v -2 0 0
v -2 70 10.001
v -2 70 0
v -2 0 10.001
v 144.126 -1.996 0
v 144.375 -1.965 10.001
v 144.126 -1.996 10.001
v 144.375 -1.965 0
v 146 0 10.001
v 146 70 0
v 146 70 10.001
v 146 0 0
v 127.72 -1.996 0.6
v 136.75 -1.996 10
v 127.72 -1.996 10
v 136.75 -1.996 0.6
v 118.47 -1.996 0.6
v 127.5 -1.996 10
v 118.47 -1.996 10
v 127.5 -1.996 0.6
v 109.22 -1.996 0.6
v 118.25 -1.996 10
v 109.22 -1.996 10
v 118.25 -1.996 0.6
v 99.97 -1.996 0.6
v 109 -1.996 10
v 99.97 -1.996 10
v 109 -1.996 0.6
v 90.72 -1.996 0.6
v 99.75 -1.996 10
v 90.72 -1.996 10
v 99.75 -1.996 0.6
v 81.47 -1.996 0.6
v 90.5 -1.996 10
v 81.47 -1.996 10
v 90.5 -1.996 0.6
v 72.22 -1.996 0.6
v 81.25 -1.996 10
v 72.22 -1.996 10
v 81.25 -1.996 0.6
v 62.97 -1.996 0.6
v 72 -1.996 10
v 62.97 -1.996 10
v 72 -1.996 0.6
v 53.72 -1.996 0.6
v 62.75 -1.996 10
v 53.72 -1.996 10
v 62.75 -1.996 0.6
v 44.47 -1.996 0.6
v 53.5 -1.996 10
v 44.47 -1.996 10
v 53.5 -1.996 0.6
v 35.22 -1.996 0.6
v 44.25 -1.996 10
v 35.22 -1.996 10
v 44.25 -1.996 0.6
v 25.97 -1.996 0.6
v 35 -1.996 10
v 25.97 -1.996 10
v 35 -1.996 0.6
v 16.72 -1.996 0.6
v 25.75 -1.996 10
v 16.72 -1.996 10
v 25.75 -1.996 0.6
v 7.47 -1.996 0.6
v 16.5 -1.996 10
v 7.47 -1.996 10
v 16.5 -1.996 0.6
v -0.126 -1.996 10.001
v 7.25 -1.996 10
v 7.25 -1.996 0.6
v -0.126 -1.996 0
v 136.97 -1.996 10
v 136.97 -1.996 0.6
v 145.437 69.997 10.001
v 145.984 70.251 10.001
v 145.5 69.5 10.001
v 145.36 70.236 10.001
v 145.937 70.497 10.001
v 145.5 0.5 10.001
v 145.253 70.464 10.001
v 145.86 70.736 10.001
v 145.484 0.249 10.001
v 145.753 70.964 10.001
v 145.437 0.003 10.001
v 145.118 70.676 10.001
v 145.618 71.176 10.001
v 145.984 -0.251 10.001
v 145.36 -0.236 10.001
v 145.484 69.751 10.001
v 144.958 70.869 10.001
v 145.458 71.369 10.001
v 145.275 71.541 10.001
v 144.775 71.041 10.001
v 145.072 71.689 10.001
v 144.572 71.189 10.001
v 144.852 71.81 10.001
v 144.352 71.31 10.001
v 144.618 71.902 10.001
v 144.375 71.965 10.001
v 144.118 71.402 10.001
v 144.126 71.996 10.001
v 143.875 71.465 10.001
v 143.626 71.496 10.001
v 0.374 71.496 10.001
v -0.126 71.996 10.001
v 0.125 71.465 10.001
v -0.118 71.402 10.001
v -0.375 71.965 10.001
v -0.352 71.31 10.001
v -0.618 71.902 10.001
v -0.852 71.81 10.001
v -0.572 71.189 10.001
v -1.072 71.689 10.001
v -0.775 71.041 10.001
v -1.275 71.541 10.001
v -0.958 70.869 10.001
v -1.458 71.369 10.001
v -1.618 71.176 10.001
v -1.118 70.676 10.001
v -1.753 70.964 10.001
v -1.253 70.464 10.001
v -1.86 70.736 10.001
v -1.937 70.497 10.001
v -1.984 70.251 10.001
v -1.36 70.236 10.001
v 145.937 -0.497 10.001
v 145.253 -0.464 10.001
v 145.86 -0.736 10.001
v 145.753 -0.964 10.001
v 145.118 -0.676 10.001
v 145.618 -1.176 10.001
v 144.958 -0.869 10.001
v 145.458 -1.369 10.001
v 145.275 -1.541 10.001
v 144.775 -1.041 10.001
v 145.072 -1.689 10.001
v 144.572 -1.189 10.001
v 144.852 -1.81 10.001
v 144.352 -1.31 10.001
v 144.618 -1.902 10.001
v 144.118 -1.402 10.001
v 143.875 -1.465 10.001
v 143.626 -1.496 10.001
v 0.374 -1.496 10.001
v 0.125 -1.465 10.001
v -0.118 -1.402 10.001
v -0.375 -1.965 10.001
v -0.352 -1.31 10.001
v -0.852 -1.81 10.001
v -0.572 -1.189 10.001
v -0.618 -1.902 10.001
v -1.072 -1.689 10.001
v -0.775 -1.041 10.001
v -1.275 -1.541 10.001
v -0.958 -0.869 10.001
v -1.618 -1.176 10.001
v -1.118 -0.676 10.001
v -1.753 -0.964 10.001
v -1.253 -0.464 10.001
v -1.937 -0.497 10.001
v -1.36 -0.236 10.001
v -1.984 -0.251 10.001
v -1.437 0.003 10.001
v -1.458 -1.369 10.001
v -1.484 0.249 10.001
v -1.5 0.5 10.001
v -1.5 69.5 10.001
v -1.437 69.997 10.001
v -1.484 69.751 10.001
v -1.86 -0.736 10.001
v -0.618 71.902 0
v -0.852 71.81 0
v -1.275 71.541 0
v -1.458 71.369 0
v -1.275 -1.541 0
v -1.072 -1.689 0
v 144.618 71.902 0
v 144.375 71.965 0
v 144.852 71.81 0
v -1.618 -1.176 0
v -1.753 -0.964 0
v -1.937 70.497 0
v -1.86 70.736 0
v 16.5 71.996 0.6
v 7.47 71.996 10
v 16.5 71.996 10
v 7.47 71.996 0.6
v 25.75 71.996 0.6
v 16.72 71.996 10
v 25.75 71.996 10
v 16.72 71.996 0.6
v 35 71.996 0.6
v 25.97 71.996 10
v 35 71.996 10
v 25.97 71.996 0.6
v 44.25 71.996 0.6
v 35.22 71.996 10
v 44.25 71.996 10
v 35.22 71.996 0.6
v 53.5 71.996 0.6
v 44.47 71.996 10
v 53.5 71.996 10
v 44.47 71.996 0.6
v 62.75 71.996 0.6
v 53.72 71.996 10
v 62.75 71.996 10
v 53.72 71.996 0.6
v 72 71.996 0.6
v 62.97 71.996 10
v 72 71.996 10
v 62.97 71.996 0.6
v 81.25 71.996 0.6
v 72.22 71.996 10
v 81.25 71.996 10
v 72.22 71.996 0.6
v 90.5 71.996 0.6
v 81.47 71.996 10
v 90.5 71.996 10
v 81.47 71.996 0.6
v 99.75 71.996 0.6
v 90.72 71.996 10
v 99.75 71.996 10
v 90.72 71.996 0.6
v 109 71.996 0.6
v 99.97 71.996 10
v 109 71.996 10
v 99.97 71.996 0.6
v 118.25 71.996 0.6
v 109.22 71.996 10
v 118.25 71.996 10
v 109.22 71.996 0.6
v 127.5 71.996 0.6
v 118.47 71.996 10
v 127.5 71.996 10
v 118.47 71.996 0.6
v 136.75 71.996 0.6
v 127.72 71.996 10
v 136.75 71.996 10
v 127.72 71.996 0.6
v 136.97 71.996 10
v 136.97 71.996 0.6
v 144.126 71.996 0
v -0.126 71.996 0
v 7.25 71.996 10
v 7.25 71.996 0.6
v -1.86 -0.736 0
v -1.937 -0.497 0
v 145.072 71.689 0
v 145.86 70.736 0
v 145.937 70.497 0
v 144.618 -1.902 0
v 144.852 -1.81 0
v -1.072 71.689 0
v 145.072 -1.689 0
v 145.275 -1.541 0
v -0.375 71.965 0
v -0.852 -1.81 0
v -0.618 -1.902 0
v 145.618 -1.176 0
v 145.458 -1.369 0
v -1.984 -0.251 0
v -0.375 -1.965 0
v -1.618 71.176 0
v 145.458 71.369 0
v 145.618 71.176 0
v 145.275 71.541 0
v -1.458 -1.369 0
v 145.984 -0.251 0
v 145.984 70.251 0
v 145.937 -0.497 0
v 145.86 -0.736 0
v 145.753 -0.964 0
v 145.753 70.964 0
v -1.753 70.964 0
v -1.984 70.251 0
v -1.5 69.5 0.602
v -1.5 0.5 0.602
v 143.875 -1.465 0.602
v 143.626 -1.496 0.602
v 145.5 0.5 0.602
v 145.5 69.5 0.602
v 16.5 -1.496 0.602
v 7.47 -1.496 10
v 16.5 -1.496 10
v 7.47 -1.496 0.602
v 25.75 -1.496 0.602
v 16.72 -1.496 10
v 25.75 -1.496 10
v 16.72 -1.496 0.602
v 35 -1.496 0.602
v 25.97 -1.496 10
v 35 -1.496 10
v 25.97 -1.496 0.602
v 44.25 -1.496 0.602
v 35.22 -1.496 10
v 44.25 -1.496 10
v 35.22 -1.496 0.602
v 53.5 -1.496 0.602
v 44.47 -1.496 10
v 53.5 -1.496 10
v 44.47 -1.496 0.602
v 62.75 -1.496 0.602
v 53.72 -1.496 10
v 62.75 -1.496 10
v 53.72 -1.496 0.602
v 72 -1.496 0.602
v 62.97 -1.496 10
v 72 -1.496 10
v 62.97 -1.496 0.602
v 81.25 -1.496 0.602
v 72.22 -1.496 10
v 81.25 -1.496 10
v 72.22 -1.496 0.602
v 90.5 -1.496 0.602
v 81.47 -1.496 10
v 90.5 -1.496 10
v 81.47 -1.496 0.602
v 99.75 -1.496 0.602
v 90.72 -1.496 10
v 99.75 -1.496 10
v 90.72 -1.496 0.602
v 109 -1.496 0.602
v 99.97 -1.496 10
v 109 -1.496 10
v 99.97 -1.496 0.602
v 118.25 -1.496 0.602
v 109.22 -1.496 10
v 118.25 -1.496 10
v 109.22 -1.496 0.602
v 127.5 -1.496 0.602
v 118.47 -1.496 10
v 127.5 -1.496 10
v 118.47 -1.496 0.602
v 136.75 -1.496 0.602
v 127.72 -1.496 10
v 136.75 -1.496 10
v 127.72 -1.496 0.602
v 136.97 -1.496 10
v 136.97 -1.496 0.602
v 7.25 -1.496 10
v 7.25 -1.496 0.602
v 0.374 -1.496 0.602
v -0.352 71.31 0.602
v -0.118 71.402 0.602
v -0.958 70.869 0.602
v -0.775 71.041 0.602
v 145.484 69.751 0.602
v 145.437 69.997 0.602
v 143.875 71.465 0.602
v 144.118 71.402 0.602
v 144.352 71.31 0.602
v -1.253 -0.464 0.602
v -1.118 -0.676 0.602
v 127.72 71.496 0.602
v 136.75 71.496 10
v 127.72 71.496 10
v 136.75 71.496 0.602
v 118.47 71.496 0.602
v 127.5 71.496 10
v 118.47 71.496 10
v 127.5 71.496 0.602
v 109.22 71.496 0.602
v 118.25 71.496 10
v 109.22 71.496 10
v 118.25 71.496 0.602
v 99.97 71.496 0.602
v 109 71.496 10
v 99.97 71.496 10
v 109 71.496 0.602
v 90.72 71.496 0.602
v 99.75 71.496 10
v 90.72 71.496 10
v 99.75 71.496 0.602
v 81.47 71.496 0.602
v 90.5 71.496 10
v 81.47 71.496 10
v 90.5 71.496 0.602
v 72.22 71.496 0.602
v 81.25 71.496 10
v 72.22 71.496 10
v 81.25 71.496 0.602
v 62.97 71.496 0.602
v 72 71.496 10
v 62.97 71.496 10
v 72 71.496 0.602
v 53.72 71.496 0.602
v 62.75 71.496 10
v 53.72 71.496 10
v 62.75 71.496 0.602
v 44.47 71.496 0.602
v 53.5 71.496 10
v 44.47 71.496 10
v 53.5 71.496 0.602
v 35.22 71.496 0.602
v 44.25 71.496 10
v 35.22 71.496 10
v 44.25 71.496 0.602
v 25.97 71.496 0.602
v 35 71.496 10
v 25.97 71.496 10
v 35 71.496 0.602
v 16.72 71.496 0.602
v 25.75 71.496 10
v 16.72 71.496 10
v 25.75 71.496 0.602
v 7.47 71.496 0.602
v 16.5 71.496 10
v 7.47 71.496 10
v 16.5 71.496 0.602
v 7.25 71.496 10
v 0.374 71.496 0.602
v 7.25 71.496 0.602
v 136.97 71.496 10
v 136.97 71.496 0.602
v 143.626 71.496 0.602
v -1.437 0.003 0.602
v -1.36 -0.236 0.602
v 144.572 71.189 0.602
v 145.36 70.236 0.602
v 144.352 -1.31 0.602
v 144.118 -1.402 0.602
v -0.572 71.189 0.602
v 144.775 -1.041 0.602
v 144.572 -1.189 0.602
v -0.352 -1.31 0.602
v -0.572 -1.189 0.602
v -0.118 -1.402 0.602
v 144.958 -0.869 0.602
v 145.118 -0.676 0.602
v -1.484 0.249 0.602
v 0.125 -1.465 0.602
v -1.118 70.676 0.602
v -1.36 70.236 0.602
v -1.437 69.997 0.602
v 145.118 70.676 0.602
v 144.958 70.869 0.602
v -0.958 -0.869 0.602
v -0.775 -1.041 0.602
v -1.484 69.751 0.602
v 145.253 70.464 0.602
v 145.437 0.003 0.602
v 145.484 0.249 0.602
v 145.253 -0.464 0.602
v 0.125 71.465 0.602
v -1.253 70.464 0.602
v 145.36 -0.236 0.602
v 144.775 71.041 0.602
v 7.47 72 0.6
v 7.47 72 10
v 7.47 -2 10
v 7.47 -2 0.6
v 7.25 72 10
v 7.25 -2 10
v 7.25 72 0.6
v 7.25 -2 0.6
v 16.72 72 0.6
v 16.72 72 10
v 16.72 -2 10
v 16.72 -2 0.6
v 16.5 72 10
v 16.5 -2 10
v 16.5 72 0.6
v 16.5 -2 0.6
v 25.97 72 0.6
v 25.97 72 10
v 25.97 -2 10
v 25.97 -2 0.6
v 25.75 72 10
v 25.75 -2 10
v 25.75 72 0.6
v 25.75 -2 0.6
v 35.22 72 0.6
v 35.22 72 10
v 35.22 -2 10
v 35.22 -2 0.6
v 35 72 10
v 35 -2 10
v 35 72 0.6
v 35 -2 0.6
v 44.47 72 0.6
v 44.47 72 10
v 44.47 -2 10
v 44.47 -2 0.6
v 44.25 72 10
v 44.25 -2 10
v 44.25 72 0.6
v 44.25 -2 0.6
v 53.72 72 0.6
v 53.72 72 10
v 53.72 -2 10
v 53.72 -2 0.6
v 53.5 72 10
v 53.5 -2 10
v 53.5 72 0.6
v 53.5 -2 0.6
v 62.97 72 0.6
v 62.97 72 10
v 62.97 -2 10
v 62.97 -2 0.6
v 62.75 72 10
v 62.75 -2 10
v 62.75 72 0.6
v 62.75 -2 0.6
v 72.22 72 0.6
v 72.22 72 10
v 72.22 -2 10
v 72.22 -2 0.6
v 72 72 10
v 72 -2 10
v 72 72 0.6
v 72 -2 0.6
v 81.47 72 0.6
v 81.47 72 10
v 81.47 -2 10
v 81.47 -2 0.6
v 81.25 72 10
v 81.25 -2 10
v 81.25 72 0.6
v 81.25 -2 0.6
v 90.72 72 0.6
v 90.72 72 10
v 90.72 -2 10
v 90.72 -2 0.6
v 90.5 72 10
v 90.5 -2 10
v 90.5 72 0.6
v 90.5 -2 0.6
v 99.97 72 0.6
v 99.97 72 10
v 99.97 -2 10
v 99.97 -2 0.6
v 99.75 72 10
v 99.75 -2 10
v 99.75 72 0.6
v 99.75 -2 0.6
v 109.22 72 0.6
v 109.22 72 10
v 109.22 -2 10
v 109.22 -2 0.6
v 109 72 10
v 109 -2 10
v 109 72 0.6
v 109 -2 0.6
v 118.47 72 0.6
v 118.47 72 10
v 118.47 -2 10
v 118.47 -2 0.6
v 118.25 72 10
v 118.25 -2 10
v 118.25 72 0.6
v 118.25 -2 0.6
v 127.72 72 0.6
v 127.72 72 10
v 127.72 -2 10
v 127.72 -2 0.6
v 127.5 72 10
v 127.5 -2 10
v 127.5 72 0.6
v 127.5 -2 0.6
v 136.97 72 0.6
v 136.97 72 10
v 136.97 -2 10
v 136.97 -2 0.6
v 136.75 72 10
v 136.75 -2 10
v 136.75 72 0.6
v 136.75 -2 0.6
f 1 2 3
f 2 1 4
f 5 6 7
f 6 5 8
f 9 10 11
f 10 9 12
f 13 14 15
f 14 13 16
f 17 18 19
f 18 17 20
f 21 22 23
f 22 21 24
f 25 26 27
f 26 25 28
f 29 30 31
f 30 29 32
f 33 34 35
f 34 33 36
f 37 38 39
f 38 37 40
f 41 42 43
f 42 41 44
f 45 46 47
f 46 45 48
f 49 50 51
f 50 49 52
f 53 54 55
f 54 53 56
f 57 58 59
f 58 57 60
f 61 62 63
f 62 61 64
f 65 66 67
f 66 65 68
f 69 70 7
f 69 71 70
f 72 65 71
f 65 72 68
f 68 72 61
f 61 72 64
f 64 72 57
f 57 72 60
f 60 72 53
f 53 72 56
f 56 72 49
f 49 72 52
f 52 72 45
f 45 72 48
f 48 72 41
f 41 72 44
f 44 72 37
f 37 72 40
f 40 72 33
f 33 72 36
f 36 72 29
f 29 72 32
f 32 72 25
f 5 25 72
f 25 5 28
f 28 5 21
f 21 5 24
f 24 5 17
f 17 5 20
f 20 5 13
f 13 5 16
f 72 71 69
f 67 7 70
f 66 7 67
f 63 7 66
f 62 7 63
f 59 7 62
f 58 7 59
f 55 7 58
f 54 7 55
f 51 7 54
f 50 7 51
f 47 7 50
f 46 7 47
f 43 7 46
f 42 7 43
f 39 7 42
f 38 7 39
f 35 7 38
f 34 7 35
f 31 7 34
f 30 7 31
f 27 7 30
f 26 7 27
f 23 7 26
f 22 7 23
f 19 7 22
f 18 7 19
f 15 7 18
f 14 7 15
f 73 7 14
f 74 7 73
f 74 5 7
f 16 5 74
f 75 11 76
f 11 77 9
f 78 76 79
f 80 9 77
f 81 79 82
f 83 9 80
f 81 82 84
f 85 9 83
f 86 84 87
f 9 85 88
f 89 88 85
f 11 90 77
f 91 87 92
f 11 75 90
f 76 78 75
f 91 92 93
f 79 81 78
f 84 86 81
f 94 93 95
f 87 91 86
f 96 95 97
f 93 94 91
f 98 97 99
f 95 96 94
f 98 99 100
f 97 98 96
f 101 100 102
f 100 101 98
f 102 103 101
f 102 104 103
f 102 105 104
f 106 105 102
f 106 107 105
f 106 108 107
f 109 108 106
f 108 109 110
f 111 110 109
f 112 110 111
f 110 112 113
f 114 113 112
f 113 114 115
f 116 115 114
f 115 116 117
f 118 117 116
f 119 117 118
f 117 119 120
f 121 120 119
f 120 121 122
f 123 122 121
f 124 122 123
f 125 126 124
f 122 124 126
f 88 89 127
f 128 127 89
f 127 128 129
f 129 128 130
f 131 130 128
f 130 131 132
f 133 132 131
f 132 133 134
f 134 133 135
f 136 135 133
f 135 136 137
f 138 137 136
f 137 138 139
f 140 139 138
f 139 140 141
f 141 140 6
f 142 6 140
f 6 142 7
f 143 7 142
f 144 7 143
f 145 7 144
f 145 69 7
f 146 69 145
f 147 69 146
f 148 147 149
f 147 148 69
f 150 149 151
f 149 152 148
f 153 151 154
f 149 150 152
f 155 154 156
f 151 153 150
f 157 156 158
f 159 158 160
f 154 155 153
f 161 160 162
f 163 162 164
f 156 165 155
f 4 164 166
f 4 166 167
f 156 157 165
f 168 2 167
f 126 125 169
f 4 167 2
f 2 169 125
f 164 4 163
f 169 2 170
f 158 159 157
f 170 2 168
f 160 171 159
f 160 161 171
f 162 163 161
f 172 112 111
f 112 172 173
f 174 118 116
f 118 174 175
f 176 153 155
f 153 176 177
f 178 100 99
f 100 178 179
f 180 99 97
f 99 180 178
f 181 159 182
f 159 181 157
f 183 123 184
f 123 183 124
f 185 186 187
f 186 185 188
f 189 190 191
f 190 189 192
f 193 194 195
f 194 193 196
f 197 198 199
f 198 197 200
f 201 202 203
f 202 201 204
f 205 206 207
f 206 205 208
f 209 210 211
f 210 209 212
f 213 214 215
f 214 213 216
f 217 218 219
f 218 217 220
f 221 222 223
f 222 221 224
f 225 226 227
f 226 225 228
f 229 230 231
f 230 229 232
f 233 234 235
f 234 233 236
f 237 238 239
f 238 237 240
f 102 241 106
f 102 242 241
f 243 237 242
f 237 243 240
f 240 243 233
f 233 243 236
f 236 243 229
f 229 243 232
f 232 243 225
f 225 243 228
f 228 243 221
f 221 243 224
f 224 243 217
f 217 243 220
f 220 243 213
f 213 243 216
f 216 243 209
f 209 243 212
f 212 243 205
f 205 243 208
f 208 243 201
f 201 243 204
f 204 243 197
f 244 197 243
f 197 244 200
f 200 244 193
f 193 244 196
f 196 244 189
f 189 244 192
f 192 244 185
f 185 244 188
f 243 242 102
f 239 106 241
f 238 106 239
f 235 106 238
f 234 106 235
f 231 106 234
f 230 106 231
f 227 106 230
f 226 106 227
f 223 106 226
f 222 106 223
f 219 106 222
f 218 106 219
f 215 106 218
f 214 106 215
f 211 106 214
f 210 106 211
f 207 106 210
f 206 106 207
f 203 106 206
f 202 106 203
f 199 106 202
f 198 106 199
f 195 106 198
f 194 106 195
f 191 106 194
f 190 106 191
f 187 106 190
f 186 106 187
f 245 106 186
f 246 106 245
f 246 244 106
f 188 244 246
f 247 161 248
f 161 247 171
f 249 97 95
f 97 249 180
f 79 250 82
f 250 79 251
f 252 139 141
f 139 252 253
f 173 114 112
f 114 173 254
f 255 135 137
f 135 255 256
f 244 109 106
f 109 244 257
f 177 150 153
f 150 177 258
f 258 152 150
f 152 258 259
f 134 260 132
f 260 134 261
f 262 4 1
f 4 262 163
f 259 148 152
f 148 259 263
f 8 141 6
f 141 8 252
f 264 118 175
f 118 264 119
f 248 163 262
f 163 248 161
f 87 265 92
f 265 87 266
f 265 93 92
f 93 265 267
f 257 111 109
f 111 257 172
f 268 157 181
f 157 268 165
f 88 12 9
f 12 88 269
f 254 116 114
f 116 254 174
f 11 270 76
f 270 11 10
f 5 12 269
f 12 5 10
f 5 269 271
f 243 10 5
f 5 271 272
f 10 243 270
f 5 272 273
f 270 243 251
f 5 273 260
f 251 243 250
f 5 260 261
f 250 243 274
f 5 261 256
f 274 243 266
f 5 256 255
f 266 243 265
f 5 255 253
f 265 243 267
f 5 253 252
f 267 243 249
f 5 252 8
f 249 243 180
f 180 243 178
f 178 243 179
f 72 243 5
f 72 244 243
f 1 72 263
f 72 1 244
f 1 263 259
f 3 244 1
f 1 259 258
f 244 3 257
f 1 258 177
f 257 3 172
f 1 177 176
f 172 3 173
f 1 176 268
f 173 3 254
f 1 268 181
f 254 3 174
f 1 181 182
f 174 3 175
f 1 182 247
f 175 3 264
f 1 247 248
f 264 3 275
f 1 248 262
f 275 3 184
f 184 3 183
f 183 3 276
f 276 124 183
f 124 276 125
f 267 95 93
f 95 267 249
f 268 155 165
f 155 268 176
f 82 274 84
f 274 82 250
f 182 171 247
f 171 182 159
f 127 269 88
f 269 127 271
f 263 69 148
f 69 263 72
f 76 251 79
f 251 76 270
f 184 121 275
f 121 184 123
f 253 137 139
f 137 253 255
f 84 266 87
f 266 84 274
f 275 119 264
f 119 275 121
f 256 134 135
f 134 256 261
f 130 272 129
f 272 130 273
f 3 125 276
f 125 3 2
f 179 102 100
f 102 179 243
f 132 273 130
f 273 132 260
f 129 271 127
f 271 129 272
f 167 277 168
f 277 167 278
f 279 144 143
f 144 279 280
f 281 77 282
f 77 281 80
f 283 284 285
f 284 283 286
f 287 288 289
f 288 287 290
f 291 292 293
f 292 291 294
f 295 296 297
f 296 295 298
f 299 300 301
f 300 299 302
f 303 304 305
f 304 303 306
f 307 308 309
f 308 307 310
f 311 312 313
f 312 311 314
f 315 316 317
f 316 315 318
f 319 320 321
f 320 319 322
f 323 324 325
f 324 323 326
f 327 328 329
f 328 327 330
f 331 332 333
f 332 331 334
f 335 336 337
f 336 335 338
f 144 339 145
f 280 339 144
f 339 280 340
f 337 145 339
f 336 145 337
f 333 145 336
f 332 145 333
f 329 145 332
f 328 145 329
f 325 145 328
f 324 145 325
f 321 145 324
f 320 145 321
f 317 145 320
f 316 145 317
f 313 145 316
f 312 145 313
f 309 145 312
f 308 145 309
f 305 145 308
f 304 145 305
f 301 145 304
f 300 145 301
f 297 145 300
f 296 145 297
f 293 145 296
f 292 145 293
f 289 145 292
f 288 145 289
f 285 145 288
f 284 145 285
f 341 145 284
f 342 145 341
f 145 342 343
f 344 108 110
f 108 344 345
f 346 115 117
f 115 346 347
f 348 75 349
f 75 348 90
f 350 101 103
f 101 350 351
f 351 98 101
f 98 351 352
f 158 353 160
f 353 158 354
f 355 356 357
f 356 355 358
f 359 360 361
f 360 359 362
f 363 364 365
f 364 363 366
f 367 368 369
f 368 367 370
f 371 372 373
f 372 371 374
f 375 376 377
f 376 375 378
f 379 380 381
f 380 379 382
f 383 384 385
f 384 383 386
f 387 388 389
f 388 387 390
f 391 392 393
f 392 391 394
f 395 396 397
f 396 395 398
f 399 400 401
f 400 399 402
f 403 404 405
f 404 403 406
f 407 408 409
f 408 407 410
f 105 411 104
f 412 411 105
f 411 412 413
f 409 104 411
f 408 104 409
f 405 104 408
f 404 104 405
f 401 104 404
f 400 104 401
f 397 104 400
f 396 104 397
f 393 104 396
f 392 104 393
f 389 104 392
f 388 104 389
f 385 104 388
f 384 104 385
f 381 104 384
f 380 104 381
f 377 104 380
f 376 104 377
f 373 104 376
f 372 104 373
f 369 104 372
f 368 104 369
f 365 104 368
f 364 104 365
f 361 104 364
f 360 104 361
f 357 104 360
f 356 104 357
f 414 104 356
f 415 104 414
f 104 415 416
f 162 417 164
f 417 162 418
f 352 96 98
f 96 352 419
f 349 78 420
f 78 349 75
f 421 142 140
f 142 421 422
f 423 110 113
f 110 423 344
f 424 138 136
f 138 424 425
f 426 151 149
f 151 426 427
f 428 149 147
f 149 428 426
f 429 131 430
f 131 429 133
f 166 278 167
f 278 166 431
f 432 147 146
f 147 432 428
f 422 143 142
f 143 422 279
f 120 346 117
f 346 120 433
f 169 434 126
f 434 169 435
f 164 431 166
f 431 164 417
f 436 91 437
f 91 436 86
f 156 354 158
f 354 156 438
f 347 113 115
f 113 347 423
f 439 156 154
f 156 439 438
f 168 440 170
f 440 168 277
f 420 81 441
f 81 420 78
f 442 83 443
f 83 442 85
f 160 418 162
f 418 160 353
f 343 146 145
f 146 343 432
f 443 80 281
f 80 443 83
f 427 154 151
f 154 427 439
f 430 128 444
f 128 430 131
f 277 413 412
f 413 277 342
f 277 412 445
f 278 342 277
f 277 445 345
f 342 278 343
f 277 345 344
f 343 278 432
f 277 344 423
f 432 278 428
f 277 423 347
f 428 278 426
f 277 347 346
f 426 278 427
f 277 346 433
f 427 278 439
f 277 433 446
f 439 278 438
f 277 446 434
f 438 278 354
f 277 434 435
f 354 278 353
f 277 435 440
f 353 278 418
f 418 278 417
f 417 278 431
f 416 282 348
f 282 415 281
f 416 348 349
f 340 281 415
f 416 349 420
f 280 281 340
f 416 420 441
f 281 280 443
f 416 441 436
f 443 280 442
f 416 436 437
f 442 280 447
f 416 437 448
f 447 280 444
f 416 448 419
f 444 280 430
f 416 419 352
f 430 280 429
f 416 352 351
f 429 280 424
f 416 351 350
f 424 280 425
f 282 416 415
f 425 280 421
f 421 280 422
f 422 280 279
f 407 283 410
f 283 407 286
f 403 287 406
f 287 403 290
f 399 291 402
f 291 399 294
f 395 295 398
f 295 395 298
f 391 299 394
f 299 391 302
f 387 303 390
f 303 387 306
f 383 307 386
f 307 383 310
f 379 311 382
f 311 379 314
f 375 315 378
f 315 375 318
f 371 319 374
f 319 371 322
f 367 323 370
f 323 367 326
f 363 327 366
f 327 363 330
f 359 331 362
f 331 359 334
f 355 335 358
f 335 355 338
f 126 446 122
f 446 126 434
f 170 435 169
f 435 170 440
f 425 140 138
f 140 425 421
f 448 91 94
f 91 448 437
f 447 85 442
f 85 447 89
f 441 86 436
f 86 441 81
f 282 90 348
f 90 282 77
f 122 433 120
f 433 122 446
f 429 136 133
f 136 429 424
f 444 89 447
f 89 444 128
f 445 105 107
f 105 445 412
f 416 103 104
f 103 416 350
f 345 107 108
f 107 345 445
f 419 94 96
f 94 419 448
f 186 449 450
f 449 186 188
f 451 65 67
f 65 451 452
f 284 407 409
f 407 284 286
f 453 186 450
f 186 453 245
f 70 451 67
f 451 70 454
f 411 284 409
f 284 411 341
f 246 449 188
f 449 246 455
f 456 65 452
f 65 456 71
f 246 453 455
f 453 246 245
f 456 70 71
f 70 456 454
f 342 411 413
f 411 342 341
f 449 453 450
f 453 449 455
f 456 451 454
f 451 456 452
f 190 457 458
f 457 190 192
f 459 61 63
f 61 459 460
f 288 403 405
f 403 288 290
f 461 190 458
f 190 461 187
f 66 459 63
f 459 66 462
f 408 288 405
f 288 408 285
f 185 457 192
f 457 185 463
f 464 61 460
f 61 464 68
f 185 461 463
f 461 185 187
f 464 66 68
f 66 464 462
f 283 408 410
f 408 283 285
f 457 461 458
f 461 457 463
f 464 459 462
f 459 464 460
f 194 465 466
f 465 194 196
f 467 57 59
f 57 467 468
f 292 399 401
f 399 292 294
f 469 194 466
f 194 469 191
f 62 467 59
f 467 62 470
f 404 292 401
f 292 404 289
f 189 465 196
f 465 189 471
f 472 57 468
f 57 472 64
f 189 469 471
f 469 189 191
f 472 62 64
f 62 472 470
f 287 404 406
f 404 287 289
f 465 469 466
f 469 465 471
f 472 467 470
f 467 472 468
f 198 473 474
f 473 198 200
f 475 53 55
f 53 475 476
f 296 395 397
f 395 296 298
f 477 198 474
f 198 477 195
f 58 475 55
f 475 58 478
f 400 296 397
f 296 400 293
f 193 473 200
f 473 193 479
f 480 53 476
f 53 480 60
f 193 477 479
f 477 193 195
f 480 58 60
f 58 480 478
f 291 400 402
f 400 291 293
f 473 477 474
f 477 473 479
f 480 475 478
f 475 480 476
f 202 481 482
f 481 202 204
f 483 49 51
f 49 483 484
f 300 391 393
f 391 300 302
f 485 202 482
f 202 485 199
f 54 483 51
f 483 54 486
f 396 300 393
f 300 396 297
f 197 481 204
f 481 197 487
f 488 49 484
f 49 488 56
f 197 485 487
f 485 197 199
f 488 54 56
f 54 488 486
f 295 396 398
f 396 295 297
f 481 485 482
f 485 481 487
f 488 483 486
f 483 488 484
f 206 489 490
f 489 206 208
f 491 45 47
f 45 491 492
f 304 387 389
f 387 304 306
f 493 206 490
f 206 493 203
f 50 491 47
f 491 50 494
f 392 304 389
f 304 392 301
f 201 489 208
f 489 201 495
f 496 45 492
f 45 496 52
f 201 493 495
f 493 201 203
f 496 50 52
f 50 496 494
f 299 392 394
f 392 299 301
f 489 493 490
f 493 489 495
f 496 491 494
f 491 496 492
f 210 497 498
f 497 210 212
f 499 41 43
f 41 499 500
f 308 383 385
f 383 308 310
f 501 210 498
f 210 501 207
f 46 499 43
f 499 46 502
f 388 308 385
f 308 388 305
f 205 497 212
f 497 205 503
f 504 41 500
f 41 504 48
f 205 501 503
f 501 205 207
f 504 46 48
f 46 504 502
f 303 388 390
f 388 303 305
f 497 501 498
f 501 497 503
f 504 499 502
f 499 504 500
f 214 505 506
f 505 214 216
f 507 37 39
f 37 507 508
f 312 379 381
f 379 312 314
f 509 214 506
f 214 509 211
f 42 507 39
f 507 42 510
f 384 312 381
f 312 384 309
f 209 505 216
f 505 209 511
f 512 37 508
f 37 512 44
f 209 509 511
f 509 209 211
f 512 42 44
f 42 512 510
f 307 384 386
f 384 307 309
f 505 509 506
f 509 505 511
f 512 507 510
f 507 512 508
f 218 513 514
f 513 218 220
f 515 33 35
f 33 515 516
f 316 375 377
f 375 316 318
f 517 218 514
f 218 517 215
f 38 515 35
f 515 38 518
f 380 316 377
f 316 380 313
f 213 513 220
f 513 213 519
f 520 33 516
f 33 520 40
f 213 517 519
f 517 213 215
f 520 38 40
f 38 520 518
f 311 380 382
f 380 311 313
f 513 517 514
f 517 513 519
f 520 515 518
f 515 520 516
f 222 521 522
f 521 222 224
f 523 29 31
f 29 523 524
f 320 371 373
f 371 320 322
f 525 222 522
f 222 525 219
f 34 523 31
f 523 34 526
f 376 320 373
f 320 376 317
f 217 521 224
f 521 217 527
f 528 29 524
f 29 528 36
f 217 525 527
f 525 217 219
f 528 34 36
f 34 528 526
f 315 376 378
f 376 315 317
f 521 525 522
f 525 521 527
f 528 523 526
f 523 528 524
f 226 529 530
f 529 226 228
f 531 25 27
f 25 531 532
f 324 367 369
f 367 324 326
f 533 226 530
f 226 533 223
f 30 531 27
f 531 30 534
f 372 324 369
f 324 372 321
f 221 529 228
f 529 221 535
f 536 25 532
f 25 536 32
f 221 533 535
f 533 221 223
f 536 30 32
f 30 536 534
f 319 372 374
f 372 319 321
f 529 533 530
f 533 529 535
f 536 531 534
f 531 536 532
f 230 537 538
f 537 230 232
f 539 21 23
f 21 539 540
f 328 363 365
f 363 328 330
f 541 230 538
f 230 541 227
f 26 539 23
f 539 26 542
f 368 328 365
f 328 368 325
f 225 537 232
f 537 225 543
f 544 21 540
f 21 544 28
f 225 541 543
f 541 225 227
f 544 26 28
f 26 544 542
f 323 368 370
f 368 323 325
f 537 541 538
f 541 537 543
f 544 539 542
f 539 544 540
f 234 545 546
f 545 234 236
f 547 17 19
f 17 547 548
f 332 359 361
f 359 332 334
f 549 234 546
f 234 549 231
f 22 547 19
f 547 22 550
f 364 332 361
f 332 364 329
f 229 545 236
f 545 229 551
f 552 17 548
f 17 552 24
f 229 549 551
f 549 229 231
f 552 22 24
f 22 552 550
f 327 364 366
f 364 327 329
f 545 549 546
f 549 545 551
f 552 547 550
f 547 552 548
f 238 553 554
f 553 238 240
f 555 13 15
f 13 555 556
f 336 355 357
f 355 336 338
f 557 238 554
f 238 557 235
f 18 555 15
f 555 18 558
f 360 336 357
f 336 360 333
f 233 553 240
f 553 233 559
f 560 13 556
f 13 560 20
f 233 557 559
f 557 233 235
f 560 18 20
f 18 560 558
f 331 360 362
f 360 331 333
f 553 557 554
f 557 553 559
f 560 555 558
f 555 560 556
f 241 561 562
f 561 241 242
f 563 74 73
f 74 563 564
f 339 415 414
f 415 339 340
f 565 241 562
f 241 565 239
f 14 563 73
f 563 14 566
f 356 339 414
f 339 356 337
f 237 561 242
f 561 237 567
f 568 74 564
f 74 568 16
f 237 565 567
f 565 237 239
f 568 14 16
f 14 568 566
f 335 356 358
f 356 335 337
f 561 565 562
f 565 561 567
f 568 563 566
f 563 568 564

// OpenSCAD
$fn=50;
kw=8;
wmul=16;
l=70;
h=10;
wt=1;
iwt=0.44;//.4;
cr=2;
lidth=0.6;
extracr=0.5;
tw=wmul*(kw+wt);

union(){
    roundbox(tw,l,h,bt=0.6);
    septices(kw+wt+cr/8,l,h,0.6,wmul);
}

ocr=cr+1;
otw=tw+ocr/2;
ol=l+ocr/2;

//color("green")translate([-ocr/4,-ocr/4,10]) lid(otw,ol,h*0.4,lidth);


module roundbox(w,l,h,bt){
  
    union(){
        //#cube([w,l,h]);
        difference(){
            minkowski(){
                cube([w,l,h]);
                cylinder(r=cr,h=0.001);
            }
            translate([wt/2,wt/2,bt+0.002])
            minkowski(){
                cube([w-wt,l-wt,h-bt]);
                cylinder(r=cr,h=0.001);
            }
        }
        *translate([-(cr+extracr),-(cr+extracr),0])
            cube([w+(cr+extracr)*2,l+(cr+extracr)*2,bt]);
    }
}

module septices(kw,l,h,bt,wmul){   
    for (i = [1:wmul-1]) {       
        translate([i*kw-cr,-cr,bt])
            cube([iwt/2,l+cr*2,h-bt]);
    }
}

module lid(w,l,h,lidth){
  difference(){
        minkowski(){
            cube([w,l,h]);
            cylinder(r=cr,h=0.001);
        }
        translate([wt/2,wt/2,-lidth-0.002])
            minkowski(){
                cube([w-wt,l-wt,h-lidth]);
                cylinder(r=cr,h=0.001);
            }
    }
}
